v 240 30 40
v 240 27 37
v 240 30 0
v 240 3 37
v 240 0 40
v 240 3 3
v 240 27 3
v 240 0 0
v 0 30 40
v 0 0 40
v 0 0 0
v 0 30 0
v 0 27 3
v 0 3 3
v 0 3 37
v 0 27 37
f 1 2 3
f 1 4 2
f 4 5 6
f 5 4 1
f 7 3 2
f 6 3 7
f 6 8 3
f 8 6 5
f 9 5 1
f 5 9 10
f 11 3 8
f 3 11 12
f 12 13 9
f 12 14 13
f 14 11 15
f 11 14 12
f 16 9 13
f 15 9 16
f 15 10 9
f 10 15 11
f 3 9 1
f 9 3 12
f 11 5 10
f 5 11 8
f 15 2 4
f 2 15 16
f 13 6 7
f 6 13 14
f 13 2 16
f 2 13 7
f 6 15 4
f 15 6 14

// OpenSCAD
$fn = 32;

// ----------------------------------------------------------------------
// Box beam: 200-250 mm hollow beam
// ----------------------------------------------------------------------

// --- parameters (mm) ---
beam_l = 240;             // beam length, X
beam_w = 30;              // beam width, Y
beam_h = 40;              // beam height, Z
wall = 3;                 // wall thickness

difference() {
  cube([beam_l, beam_w, beam_h]);
  translate([-1, wall, wall])
    cube([beam_l + 2, beam_w - 2 * wall, beam_h - 2 * wall]);
}
